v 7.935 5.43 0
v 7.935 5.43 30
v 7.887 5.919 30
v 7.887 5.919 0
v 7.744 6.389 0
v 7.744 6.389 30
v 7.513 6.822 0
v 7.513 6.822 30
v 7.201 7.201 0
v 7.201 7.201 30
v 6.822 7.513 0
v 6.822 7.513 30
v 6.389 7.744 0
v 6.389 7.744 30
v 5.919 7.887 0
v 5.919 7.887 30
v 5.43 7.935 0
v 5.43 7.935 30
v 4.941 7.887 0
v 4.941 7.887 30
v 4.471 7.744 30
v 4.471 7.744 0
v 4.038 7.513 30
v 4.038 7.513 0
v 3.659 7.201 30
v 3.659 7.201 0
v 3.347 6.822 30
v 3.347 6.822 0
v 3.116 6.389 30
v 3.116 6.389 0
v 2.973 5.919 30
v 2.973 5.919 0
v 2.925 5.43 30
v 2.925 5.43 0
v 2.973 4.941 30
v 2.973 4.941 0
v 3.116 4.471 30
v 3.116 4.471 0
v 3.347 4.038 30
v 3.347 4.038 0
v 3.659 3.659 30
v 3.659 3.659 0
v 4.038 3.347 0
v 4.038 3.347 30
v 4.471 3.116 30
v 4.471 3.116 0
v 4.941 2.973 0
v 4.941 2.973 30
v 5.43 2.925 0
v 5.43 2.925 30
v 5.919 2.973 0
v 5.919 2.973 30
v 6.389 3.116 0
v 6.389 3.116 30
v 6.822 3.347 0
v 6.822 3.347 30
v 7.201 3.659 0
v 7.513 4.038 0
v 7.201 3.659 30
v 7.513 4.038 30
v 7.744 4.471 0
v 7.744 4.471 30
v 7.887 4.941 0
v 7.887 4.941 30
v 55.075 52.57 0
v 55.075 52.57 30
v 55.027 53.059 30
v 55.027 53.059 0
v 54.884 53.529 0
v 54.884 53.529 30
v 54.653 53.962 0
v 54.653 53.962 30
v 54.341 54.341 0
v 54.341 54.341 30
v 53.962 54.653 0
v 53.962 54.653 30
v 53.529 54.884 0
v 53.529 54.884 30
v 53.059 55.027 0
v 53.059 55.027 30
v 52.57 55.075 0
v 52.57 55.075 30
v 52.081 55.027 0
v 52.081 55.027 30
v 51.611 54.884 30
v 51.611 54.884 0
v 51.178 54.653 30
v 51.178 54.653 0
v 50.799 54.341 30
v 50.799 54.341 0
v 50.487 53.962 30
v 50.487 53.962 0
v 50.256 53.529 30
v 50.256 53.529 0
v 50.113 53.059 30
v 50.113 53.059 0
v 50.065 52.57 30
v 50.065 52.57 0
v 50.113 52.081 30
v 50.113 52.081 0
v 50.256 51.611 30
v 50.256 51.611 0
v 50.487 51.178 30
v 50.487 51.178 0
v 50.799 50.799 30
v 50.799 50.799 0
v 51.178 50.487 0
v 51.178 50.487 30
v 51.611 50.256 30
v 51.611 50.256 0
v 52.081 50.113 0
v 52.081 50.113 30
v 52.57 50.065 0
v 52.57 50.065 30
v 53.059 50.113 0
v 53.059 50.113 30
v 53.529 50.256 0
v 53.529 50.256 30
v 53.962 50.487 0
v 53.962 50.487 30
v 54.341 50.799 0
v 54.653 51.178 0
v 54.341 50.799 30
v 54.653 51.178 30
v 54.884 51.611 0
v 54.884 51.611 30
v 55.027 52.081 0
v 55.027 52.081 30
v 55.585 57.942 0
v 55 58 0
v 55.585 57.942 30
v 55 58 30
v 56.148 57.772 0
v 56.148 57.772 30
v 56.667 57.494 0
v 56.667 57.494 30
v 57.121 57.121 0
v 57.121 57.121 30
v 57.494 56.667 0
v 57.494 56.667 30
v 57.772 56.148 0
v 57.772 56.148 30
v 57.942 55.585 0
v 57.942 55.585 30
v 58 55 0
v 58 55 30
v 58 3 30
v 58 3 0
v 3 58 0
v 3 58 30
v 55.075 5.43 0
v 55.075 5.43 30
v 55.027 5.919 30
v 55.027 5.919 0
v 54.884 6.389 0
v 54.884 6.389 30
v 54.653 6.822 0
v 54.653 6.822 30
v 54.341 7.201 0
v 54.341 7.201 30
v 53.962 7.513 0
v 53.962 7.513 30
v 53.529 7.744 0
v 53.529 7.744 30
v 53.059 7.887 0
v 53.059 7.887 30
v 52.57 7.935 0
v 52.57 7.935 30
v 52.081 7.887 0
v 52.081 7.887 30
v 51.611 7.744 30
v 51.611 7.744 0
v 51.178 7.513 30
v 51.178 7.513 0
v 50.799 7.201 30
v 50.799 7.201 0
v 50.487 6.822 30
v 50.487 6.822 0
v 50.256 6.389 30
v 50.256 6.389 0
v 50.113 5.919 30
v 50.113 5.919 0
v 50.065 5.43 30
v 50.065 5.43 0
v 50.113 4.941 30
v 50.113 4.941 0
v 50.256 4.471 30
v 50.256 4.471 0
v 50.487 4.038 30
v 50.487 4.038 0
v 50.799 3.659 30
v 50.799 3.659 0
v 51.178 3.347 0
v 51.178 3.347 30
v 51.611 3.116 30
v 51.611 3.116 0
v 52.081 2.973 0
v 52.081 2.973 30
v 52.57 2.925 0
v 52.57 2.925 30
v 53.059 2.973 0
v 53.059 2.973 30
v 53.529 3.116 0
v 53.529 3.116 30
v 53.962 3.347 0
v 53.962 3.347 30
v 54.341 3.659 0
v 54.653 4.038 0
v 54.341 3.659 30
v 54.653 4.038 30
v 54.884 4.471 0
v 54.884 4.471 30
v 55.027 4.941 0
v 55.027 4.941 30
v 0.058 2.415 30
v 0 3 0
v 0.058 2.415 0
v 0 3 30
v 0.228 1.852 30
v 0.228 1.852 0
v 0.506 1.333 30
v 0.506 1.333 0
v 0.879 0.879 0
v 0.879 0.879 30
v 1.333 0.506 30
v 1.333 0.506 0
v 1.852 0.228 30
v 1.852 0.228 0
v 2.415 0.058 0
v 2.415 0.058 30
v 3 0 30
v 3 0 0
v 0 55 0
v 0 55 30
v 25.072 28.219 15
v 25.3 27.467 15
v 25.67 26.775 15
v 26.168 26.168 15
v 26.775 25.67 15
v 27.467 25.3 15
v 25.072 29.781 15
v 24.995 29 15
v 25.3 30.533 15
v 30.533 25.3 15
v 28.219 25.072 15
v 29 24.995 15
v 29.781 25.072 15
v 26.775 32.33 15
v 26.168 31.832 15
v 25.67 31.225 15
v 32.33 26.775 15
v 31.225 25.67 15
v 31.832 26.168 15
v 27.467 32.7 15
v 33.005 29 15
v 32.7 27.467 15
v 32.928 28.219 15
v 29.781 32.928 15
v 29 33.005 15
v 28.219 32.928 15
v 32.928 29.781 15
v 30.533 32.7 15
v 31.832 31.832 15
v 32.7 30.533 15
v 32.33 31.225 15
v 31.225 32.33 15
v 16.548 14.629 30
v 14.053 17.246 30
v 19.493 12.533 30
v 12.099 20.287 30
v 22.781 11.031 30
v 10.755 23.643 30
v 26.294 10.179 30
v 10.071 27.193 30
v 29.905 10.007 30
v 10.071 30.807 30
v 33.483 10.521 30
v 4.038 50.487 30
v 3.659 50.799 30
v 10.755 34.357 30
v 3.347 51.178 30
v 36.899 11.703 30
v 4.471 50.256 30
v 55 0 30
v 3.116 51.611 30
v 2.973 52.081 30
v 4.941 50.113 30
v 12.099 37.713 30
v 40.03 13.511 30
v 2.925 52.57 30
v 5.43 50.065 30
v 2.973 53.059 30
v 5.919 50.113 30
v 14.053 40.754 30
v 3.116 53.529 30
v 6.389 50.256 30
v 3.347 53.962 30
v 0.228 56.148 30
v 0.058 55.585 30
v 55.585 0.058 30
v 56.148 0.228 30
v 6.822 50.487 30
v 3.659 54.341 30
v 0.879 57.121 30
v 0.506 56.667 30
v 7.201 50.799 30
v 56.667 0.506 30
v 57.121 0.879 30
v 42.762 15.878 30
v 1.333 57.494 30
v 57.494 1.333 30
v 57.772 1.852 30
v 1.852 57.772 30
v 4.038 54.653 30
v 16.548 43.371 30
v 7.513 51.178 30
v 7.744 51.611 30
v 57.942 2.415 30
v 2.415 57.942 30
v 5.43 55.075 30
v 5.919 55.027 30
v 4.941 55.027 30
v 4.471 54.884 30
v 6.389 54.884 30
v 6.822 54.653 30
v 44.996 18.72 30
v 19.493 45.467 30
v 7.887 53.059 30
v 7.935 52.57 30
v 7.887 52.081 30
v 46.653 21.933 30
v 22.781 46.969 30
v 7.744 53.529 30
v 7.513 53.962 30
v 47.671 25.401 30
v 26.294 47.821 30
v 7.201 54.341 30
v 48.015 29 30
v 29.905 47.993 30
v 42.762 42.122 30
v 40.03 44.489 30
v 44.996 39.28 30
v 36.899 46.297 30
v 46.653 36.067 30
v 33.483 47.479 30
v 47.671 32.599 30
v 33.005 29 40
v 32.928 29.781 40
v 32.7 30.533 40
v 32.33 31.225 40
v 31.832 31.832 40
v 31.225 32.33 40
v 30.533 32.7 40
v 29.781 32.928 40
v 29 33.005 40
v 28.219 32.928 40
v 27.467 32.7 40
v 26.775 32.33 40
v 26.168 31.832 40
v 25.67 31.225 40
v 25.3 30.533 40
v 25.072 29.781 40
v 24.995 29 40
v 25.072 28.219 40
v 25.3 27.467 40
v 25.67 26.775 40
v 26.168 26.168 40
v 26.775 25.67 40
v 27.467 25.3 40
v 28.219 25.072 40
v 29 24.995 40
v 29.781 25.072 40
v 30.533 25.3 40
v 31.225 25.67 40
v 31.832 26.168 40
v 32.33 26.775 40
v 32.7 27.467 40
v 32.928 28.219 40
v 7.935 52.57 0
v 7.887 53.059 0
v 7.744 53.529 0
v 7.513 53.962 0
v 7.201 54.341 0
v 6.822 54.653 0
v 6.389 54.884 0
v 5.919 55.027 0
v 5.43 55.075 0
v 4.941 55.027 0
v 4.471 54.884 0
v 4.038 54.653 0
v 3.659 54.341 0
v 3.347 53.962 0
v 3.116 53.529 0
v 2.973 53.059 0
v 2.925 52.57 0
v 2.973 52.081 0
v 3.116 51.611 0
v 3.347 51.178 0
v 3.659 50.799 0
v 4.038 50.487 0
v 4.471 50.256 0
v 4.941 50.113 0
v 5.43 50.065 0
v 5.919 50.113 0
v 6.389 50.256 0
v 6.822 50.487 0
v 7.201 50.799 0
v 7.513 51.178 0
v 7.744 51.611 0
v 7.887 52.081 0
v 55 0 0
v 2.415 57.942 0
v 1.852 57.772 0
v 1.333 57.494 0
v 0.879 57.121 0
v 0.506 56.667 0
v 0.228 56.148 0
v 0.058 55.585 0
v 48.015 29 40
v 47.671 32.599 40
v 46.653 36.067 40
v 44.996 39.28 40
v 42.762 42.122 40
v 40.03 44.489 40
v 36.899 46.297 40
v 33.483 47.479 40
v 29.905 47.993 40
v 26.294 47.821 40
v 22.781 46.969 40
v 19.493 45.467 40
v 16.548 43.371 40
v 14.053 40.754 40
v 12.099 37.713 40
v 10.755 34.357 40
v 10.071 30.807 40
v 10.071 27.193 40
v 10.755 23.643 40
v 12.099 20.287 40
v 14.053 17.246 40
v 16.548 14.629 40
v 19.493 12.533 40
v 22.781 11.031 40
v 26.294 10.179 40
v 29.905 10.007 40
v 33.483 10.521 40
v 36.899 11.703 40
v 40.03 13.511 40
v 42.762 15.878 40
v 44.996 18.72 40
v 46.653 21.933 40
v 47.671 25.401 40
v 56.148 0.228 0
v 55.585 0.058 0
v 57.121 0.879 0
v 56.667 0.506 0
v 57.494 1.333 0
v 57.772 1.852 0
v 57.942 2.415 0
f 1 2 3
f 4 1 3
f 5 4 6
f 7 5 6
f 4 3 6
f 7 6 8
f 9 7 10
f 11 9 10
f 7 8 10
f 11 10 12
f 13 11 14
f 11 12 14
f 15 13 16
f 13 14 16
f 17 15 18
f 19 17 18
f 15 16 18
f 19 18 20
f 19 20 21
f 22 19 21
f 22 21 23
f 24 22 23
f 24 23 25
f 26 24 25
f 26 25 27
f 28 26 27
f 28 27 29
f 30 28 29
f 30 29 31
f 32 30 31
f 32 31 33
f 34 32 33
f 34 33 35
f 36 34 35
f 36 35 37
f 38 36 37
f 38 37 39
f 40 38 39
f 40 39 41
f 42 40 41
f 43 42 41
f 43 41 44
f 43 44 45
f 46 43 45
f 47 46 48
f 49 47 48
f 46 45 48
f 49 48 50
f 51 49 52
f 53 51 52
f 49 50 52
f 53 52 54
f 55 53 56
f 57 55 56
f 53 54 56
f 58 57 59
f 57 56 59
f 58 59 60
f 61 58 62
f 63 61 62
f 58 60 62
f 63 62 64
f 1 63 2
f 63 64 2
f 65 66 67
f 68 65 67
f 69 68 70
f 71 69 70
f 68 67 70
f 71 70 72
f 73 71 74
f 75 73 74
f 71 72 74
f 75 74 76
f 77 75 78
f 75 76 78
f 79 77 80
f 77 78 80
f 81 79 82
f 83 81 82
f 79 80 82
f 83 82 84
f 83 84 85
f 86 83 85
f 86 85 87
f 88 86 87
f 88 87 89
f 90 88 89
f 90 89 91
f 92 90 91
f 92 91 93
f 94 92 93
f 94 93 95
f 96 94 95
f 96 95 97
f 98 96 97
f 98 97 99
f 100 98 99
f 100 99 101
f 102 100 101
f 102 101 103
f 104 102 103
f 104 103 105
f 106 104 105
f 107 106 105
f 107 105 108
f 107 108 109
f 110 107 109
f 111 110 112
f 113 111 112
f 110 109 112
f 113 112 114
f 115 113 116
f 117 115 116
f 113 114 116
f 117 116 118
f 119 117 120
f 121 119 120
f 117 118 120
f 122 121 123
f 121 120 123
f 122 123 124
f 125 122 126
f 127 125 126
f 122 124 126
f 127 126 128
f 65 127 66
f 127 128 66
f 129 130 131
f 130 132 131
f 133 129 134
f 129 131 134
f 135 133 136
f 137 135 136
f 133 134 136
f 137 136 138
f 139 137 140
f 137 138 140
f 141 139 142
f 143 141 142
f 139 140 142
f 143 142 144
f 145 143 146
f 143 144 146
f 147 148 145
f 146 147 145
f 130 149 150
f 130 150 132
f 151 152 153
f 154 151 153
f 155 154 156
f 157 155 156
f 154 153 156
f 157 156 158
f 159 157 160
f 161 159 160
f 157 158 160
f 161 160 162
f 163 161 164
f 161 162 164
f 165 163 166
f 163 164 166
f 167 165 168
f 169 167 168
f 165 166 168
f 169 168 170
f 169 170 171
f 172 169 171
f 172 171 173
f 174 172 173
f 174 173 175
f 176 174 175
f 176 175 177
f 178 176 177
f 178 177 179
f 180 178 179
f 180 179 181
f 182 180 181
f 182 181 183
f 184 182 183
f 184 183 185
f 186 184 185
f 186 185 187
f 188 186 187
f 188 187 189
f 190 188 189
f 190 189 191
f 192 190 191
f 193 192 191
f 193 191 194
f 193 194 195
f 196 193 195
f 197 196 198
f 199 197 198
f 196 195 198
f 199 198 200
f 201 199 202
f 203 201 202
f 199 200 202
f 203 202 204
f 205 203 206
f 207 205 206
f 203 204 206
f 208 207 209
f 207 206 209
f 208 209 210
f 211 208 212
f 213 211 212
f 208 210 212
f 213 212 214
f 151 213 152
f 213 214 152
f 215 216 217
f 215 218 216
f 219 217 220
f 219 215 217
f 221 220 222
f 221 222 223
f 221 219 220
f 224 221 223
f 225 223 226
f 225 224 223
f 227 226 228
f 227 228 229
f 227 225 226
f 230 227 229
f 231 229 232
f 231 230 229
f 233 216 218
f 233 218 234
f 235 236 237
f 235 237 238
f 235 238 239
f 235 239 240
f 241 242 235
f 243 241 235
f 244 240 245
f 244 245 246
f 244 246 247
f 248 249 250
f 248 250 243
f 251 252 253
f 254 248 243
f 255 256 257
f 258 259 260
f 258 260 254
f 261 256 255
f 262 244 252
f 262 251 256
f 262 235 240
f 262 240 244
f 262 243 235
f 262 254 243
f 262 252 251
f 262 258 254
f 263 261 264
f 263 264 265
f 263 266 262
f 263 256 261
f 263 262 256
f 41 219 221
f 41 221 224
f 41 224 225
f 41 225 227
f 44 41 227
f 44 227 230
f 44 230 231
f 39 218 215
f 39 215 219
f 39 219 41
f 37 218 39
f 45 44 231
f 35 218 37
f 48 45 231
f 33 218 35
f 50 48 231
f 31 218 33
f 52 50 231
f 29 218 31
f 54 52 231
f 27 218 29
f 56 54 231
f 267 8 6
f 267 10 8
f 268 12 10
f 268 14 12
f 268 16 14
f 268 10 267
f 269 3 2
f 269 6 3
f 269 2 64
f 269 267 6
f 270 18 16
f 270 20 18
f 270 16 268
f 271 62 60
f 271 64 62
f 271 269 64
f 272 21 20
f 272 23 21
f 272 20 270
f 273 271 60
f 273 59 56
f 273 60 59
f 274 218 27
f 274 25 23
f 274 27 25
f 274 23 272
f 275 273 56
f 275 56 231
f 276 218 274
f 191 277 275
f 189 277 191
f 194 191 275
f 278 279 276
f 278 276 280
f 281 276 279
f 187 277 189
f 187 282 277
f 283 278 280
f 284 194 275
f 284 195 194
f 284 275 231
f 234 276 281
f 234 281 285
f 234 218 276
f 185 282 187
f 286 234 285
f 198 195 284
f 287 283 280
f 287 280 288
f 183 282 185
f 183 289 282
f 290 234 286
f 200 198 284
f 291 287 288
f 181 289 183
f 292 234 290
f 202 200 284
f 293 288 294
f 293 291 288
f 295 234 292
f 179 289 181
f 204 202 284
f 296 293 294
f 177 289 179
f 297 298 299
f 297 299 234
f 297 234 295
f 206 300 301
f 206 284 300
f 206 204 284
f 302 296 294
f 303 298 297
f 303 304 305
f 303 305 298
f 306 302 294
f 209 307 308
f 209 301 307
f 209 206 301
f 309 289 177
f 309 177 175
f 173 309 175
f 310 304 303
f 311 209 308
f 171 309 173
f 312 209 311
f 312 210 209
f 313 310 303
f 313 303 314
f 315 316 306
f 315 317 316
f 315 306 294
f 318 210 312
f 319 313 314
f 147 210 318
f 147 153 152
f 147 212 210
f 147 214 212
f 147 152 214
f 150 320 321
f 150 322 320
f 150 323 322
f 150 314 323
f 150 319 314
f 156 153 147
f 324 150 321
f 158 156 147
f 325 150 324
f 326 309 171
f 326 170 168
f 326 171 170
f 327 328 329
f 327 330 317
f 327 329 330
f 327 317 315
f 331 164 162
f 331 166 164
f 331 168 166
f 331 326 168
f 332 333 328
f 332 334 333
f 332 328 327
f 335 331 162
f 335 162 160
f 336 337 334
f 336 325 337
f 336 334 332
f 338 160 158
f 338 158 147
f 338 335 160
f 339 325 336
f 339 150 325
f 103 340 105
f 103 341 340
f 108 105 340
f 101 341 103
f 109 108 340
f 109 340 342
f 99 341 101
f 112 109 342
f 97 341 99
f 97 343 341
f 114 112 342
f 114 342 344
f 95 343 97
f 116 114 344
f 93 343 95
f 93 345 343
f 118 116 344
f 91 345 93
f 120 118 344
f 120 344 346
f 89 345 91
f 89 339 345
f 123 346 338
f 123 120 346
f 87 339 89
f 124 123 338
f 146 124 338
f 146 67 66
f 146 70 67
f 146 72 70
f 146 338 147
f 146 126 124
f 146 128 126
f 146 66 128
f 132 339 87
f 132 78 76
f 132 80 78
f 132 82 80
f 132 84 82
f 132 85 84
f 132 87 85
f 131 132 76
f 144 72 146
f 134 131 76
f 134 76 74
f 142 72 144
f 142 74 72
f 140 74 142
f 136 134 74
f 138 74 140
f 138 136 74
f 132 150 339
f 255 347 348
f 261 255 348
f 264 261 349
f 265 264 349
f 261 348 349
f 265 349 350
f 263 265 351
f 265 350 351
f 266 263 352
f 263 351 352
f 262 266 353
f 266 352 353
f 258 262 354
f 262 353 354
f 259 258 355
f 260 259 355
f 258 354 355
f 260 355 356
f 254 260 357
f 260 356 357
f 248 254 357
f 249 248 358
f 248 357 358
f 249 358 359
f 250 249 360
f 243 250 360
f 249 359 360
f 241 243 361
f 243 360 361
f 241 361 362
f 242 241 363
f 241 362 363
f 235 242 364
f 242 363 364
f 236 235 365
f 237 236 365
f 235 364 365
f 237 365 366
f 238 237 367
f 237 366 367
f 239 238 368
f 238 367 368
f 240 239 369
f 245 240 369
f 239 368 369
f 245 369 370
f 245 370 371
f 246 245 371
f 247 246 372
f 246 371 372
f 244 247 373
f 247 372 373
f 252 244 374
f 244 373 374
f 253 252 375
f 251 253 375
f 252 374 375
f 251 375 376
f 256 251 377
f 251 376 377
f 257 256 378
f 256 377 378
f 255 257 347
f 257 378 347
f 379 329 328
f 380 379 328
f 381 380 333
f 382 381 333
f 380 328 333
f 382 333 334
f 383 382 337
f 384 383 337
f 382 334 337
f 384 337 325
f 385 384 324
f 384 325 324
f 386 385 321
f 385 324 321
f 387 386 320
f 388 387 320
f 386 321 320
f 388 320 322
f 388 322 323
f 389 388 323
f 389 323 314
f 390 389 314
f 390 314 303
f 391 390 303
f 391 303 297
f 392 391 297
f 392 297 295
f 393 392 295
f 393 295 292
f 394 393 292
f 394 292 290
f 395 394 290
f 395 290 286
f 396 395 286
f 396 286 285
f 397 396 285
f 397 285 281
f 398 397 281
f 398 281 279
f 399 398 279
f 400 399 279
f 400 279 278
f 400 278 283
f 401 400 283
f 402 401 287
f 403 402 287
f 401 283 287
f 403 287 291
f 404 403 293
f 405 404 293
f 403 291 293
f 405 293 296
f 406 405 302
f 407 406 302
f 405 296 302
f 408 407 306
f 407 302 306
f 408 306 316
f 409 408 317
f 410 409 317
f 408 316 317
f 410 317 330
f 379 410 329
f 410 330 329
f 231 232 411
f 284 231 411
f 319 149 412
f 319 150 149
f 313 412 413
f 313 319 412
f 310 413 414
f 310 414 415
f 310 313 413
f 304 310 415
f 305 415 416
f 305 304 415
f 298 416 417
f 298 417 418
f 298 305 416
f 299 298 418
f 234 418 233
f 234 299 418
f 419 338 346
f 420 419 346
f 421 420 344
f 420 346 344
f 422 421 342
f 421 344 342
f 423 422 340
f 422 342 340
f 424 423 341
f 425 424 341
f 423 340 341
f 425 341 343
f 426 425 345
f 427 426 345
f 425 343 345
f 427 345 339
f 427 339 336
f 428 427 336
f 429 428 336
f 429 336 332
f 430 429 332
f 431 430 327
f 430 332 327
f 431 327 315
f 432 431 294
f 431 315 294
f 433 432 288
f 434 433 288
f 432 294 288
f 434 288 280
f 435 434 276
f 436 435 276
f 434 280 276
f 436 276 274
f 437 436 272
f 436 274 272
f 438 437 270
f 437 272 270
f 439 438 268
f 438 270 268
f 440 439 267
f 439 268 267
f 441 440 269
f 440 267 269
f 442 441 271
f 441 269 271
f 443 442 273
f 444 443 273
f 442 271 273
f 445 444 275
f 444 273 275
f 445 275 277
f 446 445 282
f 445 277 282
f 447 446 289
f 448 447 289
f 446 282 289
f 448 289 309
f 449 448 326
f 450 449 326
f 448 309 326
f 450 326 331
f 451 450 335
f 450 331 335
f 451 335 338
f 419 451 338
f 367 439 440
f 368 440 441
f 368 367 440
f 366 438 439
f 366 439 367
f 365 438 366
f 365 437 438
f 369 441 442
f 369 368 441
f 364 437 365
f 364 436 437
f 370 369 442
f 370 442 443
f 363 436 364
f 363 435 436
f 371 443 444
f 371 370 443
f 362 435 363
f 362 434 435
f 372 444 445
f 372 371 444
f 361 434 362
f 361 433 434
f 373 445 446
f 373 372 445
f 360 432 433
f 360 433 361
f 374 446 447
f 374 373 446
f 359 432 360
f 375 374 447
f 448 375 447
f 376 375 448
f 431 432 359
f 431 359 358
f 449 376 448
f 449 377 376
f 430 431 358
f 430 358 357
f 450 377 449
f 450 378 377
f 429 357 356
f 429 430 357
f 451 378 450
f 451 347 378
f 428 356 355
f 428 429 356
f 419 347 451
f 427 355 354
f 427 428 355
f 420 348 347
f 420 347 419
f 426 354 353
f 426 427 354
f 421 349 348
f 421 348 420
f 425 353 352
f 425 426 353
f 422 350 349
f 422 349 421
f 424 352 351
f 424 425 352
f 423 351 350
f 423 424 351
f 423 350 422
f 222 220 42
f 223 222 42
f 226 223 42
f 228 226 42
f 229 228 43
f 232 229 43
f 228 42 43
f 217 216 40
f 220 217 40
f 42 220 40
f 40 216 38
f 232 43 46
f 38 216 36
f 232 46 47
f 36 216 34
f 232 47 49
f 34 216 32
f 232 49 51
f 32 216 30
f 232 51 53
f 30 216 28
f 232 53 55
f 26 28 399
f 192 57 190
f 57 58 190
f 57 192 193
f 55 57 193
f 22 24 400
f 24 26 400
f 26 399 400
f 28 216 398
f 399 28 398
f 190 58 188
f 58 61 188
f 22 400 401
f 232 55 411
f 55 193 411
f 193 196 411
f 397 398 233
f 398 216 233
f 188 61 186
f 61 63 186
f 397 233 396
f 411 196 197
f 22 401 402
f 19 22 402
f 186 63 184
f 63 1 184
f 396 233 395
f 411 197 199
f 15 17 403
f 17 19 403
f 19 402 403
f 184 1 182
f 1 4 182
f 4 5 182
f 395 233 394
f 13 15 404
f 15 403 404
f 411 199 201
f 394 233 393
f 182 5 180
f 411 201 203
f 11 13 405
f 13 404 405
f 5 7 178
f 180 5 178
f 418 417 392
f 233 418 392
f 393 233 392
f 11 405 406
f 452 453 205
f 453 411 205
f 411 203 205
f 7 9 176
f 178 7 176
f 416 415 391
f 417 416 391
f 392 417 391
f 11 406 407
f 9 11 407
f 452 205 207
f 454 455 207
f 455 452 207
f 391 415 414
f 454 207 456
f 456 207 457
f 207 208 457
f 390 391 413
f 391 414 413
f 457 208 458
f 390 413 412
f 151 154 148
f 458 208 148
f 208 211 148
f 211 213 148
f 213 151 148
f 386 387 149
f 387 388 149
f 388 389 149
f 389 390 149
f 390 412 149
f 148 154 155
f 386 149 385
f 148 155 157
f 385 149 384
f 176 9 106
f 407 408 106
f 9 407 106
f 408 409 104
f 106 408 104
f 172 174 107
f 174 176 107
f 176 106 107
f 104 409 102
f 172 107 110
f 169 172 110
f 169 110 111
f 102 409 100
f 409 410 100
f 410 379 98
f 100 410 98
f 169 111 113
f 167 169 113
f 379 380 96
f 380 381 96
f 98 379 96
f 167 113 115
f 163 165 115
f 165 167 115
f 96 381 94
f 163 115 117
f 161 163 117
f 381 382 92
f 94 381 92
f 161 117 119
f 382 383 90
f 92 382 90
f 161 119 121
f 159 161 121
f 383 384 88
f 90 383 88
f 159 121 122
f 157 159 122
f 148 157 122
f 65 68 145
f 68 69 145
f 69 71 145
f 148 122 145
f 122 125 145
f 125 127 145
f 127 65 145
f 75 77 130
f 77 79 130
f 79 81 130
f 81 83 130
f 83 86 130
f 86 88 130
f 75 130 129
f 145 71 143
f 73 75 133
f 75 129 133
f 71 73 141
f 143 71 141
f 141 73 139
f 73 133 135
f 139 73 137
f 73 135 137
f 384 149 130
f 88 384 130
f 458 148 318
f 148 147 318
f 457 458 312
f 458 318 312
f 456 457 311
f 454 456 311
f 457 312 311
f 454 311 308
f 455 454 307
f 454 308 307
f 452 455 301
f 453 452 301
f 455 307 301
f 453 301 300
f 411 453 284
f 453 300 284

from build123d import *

# Parameters (mm, degrees)
SKETCH_1_W          = 58
SKETCH_1_H          = 58
EXTRUDE_1_DEPTH     = 30
SKETCH_2_R          = 19.015
EXTRUDE_2_DEPTH     = 10
SKETCH_3_R          = 4.005
CUT_EXTRUDE_2_DEPTH = 25
SKETCH_4_R          = 2.505
CUT_EXTRUDE_3_DEPTH = 88.338422244
FILLET_1_R          = 3
FILLET_2_R          = 3
FILLET_3_R          = 3
FILLET_4_R          = 3


with BuildPart() as part:
    # 草图1 → 凸台-拉伸1 (new body)
    with BuildSketch(Plane.XY):
        with Locations((29, 29)):
            Rectangle(SKETCH_1_W, SKETCH_1_H)
    extrude(amount=EXTRUDE_1_DEPTH)

    # 草图2 → 凸台-拉伸2 (add)
    with BuildSketch(Plane.XY.offset(30)):
        with Locations((29, 29)):
            Circle(SKETCH_2_R)
    extrude(amount=EXTRUDE_2_DEPTH)

    # 草图3 → 切除-拉伸2 (cut)
    with BuildSketch(Plane.XY.offset(40)):
        with Locations((29, 29)):
            Circle(SKETCH_3_R)
    extrude(amount=-CUT_EXTRUDE_2_DEPTH, mode=Mode.SUBTRACT)

    # 草图4 → 切除-拉伸3 (cut, through all)
    with BuildSketch(Plane.XY.offset(30)):
        with Locations((52.57, 52.57)):
            Circle(SKETCH_4_R)
        with Locations((5.43, 52.57)):
            Circle(SKETCH_4_R)
        with Locations((5.43, 5.43)):
            Circle(SKETCH_4_R)
        with Locations((52.57, 5.43)):
            Circle(SKETCH_4_R)
    extrude(amount=-CUT_EXTRUDE_3_DEPTH, mode=Mode.SUBTRACT)

    # 圆角1
    fillet_1_edges = [part.edges().sort_by_distance(p)[0] for p in [
        (58, 58, 15),
    ]]
    fillet(fillet_1_edges, radius=FILLET_1_R)

    # 圆角2
    fillet_2_edges = [part.edges().sort_by_distance(p)[0] for p in [
        (58, 0, 15),
    ]]
    fillet(fillet_2_edges, radius=FILLET_2_R)

    # 圆角3
    fillet_3_edges = [part.edges().sort_by_distance(p)[0] for p in [
        (0, 58, 15),
    ]]
    fillet(fillet_3_edges, radius=FILLET_3_R)

    # 圆角4
    fillet_4_edges = [part.edges().sort_by_distance(p)[0] for p in [
        (0, 0, 15),
    ]]
    fillet(fillet_4_edges, radius=FILLET_4_R)


solid = part.part
